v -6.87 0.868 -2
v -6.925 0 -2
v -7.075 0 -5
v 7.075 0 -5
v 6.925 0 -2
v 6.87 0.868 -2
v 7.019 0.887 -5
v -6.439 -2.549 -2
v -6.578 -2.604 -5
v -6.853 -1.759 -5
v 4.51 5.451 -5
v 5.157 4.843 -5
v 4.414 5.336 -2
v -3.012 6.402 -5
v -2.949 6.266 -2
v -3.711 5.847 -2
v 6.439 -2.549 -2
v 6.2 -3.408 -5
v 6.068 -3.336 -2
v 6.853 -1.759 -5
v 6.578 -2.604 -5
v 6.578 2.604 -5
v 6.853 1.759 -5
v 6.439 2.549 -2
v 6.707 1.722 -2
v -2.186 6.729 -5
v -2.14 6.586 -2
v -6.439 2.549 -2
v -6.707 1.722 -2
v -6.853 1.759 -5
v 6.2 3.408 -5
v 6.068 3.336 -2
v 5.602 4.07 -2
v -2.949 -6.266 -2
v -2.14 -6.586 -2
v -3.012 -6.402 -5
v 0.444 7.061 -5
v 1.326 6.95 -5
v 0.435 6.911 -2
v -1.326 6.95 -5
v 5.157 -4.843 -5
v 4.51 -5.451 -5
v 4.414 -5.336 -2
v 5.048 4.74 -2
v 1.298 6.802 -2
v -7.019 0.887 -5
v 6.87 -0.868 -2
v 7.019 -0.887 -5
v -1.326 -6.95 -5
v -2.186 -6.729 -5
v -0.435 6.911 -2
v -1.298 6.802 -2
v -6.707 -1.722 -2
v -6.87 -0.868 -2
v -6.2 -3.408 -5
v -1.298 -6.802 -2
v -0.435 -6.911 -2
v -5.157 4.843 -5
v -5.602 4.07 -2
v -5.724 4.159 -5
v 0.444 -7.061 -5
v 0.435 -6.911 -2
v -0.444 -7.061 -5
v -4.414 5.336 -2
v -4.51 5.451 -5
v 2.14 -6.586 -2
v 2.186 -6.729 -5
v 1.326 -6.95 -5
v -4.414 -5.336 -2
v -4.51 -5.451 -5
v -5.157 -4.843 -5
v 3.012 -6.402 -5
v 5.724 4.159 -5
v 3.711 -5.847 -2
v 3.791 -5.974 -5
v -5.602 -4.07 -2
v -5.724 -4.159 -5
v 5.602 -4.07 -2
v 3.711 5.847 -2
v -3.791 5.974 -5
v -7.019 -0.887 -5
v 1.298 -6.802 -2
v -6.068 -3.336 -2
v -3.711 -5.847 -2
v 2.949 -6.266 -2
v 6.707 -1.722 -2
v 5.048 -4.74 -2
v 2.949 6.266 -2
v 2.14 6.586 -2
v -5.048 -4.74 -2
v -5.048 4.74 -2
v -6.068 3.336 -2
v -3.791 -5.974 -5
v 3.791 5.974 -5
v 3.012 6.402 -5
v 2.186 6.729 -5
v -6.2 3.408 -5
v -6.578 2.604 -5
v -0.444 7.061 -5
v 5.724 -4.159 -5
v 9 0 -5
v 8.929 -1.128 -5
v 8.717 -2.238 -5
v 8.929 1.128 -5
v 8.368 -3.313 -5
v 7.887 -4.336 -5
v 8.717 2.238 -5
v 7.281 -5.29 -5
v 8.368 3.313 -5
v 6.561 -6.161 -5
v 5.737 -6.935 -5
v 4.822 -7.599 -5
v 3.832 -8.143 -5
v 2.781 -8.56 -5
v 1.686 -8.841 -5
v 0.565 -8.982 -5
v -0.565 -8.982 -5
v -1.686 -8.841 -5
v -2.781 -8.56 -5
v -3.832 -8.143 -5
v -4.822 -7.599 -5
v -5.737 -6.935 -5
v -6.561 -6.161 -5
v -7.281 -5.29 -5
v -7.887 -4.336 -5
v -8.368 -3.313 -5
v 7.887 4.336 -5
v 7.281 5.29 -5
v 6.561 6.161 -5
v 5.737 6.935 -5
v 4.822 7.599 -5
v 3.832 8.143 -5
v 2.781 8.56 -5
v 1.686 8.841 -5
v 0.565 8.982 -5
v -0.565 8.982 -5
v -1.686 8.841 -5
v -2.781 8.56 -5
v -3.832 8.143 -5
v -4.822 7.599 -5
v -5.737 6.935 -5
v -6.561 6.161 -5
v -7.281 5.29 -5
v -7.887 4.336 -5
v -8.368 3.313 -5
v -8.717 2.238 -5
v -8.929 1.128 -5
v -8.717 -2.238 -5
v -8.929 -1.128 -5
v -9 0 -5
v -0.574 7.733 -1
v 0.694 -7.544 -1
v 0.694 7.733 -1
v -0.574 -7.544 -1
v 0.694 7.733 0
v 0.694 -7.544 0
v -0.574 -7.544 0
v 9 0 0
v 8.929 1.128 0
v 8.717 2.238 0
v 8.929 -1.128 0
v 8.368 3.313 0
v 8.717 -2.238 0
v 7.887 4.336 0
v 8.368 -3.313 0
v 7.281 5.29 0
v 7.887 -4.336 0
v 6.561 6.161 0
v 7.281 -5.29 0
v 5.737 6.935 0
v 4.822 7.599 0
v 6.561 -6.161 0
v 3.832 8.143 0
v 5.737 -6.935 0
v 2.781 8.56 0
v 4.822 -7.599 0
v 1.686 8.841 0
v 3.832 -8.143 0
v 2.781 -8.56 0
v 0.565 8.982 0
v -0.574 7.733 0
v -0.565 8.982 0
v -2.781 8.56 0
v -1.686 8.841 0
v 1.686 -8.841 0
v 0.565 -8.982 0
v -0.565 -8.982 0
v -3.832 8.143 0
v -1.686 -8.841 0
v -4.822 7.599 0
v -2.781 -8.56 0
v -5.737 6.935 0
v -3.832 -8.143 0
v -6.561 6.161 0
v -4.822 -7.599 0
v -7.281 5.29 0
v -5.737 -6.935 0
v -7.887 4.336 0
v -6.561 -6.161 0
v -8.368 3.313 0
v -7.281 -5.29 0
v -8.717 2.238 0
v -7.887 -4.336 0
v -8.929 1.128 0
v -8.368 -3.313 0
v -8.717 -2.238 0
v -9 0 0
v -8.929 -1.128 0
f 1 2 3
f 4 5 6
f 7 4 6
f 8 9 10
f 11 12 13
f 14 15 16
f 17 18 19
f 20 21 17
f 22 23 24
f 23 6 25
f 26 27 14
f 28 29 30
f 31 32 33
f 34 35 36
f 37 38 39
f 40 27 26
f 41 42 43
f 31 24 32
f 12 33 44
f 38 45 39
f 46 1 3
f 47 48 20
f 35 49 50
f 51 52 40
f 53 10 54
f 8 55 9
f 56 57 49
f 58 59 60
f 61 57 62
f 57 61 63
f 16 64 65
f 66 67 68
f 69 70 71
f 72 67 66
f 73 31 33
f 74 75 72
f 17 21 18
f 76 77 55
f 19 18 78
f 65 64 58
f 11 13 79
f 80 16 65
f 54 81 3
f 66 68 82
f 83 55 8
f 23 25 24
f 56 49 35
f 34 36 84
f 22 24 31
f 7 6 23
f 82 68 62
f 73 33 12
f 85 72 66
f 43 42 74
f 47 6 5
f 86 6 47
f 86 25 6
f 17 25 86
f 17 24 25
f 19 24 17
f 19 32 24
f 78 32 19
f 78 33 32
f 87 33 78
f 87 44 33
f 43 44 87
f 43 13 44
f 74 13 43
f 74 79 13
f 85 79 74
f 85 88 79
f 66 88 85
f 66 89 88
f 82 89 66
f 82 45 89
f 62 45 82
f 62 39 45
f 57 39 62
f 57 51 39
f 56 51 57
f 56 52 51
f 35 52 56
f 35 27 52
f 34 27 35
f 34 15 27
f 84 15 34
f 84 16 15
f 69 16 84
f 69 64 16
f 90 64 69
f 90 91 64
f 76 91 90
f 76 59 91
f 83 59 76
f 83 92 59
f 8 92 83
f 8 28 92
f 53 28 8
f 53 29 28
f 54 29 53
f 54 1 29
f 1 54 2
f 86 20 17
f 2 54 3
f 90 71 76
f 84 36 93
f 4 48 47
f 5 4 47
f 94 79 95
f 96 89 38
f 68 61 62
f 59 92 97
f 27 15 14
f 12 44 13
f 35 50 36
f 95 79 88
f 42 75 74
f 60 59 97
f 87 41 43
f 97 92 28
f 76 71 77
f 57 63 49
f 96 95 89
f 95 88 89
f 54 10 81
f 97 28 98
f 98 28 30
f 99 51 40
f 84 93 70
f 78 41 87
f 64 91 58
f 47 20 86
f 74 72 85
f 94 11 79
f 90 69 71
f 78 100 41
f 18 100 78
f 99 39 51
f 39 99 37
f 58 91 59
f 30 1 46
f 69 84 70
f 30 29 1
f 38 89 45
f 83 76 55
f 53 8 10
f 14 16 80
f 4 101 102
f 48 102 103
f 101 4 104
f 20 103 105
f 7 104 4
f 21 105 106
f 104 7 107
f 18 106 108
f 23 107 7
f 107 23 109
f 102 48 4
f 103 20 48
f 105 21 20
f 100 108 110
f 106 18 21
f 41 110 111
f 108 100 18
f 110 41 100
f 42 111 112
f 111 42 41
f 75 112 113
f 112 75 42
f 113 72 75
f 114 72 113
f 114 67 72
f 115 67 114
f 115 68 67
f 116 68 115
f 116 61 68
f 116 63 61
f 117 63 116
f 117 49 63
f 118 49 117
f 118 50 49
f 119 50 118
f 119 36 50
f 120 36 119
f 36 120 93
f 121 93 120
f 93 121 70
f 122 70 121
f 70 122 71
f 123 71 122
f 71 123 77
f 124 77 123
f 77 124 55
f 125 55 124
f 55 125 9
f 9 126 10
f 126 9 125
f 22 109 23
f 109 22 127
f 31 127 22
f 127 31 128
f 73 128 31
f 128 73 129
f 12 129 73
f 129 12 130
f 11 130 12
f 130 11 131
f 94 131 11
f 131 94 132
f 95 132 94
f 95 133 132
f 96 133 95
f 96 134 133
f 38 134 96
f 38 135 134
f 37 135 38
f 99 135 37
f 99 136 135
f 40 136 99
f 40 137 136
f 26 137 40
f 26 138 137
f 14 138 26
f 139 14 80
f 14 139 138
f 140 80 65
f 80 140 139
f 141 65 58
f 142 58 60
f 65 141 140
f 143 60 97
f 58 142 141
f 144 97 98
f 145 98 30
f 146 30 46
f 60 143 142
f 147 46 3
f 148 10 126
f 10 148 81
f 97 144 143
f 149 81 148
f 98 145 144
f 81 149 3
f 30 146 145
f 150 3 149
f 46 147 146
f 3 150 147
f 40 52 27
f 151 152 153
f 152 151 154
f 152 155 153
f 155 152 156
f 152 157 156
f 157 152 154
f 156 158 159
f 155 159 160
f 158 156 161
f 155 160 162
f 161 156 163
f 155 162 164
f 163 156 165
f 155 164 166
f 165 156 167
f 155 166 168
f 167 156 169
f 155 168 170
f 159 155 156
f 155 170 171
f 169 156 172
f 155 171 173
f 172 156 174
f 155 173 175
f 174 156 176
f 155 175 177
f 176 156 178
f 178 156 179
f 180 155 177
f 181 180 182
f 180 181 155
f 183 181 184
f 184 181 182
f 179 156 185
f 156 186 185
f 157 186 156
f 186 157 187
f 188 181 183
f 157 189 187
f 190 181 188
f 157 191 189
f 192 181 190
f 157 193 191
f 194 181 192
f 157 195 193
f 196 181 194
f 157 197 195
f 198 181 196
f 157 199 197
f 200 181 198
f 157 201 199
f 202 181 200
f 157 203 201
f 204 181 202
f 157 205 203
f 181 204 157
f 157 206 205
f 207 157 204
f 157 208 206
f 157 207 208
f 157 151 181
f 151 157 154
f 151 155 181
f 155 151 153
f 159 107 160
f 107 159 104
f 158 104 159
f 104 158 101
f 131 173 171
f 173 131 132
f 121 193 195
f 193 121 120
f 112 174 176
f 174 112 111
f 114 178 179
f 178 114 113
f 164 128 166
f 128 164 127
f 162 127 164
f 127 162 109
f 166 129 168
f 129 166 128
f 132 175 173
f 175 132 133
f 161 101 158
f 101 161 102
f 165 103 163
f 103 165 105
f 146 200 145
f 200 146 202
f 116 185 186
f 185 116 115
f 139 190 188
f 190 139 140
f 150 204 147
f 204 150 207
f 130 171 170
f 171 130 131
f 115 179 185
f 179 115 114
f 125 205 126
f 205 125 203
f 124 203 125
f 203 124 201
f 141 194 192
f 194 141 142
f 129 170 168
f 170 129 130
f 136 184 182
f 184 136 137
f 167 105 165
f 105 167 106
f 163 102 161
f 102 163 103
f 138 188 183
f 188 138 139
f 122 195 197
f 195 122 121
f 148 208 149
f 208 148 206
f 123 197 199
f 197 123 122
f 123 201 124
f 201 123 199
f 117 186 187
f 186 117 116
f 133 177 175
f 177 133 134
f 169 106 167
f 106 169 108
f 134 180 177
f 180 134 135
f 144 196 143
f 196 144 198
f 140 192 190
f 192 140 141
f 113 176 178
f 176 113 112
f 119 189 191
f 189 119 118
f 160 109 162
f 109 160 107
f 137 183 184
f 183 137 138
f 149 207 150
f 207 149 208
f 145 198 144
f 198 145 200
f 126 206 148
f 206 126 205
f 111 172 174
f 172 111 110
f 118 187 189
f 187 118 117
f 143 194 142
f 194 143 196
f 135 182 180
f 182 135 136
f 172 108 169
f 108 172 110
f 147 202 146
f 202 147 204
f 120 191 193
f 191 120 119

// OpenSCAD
$fn = 50;

difference() {
	union() {
		translate(v = [0, 0, -5.0]) {
			cylinder(h = 5, r = 9.0);
		}
	}
	union() {
		#translate(v = [0, 0, -5.0]) {
			cylinder(h = 3, r1 = 7.075, r2 = 6.925);
		}
		translate(v = [0, 0, -1]) {
			linear_extrude(height = 1) {
				text(font = "Wingdings", halign = "center", size = 11, text = "|", valign = "center");
			}
		}
	}
}
